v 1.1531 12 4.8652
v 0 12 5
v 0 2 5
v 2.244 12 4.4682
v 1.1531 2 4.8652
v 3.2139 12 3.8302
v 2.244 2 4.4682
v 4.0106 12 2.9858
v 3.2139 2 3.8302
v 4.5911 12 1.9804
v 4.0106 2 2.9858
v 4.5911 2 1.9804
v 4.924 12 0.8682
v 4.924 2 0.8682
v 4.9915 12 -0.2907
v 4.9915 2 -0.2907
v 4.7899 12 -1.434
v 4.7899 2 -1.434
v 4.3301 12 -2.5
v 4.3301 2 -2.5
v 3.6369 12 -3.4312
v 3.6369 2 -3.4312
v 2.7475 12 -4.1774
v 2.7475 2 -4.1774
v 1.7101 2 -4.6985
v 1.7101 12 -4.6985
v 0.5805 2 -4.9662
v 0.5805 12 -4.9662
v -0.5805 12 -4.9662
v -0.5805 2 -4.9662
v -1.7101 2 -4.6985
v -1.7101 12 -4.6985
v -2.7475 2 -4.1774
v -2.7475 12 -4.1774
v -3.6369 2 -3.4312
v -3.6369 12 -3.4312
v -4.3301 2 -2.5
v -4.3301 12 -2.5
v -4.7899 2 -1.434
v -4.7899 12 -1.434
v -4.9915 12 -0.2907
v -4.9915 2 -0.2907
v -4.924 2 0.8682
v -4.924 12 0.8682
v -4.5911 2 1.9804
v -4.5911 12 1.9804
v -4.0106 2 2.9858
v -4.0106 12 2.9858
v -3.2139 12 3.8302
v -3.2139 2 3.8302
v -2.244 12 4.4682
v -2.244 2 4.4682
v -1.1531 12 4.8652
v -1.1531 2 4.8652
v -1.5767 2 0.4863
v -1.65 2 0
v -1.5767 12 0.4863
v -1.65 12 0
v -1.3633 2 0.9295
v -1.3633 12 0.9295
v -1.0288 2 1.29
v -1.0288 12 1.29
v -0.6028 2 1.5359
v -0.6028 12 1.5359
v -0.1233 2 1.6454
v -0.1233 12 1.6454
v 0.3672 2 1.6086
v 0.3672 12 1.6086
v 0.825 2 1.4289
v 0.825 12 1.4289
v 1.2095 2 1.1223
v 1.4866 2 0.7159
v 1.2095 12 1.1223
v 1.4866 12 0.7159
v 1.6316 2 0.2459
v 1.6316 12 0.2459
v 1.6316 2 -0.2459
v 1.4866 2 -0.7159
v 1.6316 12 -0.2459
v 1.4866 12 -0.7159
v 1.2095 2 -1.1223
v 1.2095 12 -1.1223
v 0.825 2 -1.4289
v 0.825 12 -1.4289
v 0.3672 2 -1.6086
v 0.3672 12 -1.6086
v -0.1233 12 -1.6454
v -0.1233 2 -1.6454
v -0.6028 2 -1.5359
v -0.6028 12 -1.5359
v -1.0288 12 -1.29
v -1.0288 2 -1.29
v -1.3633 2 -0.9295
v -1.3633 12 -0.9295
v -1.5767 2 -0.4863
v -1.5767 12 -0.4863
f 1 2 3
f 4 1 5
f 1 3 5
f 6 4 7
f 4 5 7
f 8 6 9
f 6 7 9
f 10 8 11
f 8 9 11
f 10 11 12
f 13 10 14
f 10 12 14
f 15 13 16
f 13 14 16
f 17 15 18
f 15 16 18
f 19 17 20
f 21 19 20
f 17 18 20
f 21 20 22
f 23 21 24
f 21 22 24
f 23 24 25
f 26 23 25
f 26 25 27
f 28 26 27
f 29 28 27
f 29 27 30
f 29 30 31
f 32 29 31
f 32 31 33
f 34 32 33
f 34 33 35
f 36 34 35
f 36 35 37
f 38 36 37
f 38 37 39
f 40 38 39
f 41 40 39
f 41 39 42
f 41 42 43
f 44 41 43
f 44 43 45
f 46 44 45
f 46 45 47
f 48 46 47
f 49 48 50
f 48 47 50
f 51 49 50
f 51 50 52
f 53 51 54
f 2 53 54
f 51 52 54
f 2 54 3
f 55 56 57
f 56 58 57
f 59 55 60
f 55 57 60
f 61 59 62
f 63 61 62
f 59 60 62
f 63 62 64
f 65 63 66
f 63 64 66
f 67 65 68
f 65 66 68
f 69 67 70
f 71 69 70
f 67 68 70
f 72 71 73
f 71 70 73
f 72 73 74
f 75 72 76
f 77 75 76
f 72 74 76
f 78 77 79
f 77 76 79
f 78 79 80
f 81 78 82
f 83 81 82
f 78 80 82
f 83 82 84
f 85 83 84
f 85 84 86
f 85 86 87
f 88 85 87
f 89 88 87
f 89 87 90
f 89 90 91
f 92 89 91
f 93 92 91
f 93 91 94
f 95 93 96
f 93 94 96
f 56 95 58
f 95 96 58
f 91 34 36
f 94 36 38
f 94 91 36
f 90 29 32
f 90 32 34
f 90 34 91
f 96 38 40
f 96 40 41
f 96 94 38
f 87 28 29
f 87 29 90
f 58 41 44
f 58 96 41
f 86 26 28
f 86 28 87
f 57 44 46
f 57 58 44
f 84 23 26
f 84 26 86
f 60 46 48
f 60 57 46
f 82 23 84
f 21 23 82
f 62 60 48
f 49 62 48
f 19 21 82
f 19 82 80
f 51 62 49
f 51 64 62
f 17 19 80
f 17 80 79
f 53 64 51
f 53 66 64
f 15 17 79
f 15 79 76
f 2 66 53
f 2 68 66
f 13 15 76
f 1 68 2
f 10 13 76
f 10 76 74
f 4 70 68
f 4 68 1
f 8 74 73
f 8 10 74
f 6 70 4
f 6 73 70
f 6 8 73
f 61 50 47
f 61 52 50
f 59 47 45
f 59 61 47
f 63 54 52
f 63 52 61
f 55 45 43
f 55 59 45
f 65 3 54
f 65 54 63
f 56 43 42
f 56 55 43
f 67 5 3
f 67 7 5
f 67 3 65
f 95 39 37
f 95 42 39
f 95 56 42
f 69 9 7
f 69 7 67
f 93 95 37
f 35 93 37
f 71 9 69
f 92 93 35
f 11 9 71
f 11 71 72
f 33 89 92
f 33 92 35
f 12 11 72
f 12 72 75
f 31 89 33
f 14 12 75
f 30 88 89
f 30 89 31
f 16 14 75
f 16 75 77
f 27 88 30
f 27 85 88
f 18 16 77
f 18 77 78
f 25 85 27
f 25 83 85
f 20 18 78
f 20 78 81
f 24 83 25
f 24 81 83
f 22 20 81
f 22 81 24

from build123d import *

# Parameters (mm, degrees)
SKETCH_1_R                   = 5
EXTRUDE_1_DEPTH              = 12
HOLE_WIZARD_M4_1_D           = 3.3
HOLE_WIZARD_M4_1_CSINK_D     = 4.05
HOLE_WIZARD_M4_1_CSINK_ANGLE = 90
SKETCH_7_R                   = 5
CUT_EXTRUDE_1_DEPTH          = 2


with BuildPart() as part:
    # 草图1 → 凸台-拉伸1 (new body)
    with BuildSketch(Plane(origin=(0, 0, 0), x_dir=(1, 0, 0), z_dir=(0, 1, 0))):
        with Locations(Location((0, 0, 0), (0, 0, 270))):
            Circle(SKETCH_1_R)
    extrude(amount=EXTRUDE_1_DEPTH)

    # M4 螺纹孔1 (through all)
    with Locations(Plane.XZ):
        with Locations((0, 0)):
            CounterSinkHole(HOLE_WIZARD_M4_1_D / 2, HOLE_WIZARD_M4_1_CSINK_D / 2, counter_sink_angle=HOLE_WIZARD_M4_1_CSINK_ANGLE)

    # 草图7 → 切除-拉伸1 (cut)
    with BuildSketch(Plane.XZ):
        with Locations(Location((0, 0, 0), (0, 0, 270))):
            Circle(SKETCH_7_R)
    extrude(amount=-CUT_EXTRUDE_1_DEPTH, mode=Mode.SUBTRACT)


solid = part.part
